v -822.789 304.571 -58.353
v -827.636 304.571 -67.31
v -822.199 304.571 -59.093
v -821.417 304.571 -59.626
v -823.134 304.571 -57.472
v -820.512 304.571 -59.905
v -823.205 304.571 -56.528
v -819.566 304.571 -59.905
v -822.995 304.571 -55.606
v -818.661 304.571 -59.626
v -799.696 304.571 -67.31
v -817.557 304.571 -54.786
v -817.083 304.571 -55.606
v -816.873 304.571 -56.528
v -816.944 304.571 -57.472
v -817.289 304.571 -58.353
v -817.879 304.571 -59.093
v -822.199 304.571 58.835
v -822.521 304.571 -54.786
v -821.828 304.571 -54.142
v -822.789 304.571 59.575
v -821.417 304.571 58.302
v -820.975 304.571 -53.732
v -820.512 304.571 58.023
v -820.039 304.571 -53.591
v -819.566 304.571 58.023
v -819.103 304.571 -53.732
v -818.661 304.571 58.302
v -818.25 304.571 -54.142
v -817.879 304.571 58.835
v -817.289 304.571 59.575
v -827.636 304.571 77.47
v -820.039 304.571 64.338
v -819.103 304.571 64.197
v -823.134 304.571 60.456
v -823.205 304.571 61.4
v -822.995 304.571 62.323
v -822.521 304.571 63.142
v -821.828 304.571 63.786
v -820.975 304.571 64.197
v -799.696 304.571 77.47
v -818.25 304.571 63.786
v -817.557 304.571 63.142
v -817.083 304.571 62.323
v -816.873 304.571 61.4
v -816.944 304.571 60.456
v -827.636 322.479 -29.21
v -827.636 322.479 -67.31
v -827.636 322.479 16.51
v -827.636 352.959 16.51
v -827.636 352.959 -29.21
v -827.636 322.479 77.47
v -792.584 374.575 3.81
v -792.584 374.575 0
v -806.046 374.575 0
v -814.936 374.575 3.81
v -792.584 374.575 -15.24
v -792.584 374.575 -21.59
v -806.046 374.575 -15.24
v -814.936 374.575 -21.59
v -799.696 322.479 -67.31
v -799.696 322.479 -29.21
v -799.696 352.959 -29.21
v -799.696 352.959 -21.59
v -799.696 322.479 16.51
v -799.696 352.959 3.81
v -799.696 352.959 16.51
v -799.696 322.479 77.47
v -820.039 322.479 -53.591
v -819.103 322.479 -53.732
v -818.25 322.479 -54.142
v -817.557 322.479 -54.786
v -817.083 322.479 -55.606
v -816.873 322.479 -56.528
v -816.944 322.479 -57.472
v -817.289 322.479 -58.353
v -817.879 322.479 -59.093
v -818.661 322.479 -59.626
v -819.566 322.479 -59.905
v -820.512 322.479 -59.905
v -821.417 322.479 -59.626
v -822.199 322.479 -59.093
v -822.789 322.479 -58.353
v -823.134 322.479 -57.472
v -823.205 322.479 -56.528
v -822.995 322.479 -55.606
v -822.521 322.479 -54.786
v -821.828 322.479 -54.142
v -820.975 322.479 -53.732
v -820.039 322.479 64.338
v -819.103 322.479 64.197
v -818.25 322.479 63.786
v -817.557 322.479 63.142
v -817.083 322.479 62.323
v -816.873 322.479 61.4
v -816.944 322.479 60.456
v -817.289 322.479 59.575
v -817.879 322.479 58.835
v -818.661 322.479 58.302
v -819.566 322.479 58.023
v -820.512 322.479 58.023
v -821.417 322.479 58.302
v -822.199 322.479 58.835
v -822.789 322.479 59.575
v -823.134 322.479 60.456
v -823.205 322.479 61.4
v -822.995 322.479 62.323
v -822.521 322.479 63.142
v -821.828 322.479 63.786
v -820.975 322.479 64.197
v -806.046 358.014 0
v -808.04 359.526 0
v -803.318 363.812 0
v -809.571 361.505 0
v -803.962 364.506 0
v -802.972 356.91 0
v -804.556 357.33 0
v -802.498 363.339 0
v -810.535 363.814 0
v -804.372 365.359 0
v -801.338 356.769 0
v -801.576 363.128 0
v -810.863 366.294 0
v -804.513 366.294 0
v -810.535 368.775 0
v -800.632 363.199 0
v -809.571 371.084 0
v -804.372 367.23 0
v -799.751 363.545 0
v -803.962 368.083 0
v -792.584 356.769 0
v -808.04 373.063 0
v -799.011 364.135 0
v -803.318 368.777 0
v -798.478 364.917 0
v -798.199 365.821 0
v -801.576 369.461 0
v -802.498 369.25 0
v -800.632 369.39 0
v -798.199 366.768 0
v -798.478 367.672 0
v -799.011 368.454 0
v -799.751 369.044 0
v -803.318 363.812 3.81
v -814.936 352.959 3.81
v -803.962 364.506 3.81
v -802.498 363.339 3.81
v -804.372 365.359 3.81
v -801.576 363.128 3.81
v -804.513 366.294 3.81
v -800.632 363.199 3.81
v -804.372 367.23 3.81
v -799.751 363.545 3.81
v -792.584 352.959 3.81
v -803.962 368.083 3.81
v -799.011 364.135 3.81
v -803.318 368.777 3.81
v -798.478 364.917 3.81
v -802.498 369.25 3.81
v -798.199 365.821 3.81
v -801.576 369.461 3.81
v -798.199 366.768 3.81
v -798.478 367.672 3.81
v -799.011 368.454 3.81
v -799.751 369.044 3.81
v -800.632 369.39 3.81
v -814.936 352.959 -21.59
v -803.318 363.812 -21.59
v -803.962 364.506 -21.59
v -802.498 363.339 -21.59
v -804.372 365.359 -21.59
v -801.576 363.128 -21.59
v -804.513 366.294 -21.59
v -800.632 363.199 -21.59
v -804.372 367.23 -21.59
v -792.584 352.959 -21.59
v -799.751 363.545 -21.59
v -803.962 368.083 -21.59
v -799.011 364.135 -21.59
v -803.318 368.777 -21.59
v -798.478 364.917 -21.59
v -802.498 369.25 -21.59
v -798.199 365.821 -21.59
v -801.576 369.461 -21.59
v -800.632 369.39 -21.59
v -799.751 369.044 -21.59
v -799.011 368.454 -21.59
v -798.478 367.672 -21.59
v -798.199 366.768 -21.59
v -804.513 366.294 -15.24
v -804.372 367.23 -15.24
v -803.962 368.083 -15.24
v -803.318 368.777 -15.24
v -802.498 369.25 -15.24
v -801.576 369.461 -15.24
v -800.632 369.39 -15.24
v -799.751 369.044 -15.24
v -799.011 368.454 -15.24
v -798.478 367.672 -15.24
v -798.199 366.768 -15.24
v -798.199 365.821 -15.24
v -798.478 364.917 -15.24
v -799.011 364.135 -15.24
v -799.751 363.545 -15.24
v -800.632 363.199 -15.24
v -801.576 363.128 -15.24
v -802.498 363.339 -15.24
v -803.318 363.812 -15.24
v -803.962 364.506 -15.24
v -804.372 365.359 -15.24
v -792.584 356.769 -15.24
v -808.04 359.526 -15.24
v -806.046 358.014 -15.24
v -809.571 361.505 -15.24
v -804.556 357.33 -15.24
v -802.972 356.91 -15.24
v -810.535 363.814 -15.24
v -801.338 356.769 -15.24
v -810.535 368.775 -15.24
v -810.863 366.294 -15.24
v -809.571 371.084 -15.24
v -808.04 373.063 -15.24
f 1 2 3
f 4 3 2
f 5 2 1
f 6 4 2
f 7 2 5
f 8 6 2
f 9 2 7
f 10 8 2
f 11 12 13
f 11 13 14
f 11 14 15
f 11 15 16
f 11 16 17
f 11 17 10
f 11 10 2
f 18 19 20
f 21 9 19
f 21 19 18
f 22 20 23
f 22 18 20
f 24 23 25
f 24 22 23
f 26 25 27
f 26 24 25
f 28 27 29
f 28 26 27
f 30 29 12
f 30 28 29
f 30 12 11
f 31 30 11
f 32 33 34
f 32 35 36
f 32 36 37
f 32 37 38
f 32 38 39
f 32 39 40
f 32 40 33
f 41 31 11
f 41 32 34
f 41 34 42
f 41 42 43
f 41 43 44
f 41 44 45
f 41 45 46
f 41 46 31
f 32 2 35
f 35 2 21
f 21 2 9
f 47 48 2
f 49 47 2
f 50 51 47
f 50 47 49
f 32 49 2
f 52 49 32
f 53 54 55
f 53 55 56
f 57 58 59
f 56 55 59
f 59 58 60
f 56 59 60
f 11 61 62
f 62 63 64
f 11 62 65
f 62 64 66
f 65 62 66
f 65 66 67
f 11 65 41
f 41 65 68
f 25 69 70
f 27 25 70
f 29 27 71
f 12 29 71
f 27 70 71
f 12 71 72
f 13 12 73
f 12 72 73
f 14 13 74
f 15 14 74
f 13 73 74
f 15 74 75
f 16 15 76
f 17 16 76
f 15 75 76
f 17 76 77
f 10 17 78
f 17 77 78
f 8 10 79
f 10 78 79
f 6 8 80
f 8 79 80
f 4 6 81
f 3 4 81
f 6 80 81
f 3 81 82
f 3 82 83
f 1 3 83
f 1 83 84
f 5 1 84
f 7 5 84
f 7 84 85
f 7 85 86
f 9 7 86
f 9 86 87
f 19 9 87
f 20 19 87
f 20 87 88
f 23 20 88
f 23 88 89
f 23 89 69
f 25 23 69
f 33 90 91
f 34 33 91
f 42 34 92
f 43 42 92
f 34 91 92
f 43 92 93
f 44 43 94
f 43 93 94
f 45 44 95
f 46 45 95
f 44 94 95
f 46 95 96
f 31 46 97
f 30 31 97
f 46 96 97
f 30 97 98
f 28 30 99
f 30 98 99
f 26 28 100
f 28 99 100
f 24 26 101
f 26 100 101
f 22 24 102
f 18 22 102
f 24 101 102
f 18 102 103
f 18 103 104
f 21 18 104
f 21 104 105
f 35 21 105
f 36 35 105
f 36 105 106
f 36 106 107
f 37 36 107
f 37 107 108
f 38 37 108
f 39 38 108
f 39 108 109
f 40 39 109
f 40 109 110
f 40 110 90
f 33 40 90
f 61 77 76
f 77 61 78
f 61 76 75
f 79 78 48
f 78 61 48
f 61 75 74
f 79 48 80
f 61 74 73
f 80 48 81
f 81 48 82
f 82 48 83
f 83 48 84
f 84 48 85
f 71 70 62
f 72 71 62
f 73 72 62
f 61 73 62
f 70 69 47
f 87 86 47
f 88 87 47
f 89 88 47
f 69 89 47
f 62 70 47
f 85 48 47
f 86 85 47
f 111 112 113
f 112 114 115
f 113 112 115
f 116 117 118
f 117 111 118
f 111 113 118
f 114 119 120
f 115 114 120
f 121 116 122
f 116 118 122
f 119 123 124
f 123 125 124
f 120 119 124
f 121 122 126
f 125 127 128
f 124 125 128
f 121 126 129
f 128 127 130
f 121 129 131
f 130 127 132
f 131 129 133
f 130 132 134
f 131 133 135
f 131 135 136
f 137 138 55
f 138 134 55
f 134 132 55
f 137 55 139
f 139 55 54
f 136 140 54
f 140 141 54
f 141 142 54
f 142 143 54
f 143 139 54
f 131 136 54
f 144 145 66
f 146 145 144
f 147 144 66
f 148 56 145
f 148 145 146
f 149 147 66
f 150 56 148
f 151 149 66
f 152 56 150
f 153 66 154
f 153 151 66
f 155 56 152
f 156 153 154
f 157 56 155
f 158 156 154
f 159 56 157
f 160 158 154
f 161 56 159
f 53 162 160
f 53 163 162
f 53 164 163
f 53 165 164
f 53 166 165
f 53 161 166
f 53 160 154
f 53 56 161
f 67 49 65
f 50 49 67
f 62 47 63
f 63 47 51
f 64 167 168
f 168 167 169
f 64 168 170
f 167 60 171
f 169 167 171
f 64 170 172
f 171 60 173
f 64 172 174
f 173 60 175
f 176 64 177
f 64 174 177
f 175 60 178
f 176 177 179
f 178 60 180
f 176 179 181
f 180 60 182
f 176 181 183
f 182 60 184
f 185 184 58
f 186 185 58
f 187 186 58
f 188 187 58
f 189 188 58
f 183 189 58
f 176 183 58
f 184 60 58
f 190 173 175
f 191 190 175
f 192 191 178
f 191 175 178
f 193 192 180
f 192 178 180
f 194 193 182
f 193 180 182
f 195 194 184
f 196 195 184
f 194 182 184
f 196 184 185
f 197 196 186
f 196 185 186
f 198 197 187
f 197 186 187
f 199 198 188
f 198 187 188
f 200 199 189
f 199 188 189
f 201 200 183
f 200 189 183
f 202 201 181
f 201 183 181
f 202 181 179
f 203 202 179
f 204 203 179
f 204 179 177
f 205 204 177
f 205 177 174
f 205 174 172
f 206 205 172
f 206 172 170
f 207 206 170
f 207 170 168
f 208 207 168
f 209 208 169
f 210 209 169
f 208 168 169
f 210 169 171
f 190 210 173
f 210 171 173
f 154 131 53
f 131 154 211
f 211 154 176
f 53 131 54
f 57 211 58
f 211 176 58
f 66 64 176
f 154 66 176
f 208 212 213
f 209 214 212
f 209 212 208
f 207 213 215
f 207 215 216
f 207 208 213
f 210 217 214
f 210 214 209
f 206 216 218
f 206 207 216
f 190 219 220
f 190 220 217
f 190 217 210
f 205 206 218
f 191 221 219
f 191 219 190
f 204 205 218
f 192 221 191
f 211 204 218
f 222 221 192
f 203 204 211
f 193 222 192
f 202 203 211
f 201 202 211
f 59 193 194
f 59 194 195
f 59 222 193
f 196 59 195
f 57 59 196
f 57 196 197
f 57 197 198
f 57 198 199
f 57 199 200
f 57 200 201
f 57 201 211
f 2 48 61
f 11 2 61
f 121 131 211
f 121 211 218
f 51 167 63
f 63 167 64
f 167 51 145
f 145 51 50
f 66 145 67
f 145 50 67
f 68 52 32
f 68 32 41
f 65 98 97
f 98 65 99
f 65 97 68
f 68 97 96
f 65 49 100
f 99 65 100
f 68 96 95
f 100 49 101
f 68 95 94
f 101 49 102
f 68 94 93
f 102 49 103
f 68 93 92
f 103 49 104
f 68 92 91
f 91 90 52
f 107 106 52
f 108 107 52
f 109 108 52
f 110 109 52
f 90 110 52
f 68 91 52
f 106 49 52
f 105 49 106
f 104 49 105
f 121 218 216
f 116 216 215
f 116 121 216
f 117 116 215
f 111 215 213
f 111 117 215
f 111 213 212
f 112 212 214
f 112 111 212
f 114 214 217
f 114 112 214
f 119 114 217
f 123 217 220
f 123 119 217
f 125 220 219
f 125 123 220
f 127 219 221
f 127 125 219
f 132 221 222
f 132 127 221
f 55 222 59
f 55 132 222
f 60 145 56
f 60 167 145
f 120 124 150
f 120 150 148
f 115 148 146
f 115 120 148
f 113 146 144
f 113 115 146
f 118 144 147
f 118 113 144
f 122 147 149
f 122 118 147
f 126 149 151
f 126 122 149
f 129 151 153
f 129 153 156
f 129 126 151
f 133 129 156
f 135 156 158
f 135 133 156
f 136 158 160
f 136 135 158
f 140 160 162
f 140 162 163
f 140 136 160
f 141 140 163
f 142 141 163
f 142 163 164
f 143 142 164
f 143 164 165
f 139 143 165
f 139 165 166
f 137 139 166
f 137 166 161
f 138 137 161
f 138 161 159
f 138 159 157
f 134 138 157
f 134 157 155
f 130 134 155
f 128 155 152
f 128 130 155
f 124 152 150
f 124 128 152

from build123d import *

# Parameters (mm, degrees)
BOSS_EXTRUDE1_DEPTH = 21.59
SKETCH2_W           = 22.352
SKETCH2_H           = 21.6154
SKETCH2_R           = 3.175
BOSS_EXTRUDE2_DEPTH = 3.81
SKETCH3_R           = 3.175
BOSS_EXTRUDE3_DEPTH = 6.35
SKETCH4_W           = 27.94
SKETCH4_H           = 144.78
BOSS_EXTRUDE4_DEPTH = 48.388036719
SKETCH5_W           = 38.1
SKETCH5_H           = 30.48
SKETCH5_W_2         = 60.96
CUT_EXTRUDE1_DEPTH  = 385.104870976
SKETCH6_R           = 3.175
CUT_EXTRUDE2_DEPTH  = 833.884500924


with BuildPart() as part:
    # Sketch1 → Boss-Extrude1 (new body)
    with BuildSketch(Plane.XY):
        with BuildLine():
            Line((-792.583825879, 352.959436719), (-792.583825879, 356.769436719))
            Line((-792.583825879, 356.769436719), (-801.338321143, 356.769436719))
            ThreePointArc((-801.338321143, 356.769436719), (-803.772947911, 357.085841957), (-806.045825879, 358.014036719))
            ThreePointArc((-806.045825879, 358.014036719), (-810.863321143, 366.294436719), (-806.045825879, 374.574836719))
            Line((-806.045825879, 374.574836719), (-814.935825879, 374.574836719))
            Line((-814.935825879, 374.574836719), (-814.935825879, 352.959436719))
            Line((-814.935825879, 352.959436719), (-792.583825879, 352.959436719))
        make_face()
    extrude(amount=-BOSS_EXTRUDE1_DEPTH)

    # Sketch2 → Boss-Extrude2 (add)
    with BuildSketch(Plane.XY):
        with Locations((-803.759825879, 363.767136719)):
            Rectangle(SKETCH2_W, SKETCH2_H)
        with Locations(Location((-801.338321143, 366.294436719, 0), (0, 0, 180))):
            Circle(SKETCH2_R, mode=Mode.SUBTRACT)
    extrude(amount=BOSS_EXTRUDE2_DEPTH)

    # Sketch3 → Boss-Extrude3 (add)
    with BuildSketch(Plane(origin=(0, 0, -21.59), x_dir=(-1, 0, 0), z_dir=(0, 0, -1))):
        with BuildLine():
            Line((792.583825879, 356.769436719), (792.583825879, 374.574836719))
            Line((792.583825879, 374.574836719), (806.045825879, 374.574836719))
            ThreePointArc((806.045825879, 374.574836719), (810.546915906, 363.859809951), (801.338321143, 356.769436719))
            Line((801.338321143, 356.769436719), (792.583825879, 356.769436719))
        make_face()
        with Locations((801.338321143, 366.294436719)):
            Circle(SKETCH3_R, mode=Mode.SUBTRACT)
    extrude(amount=-BOSS_EXTRUDE3_DEPTH)

    # Sketch4 → Boss-Extrude4 (add)
    with BuildSketch(Plane.XZ.offset(-352.959436719)):
        with Locations((-813.665825879, 5.08)):
            Rectangle(SKETCH4_W, SKETCH4_H)
    extrude(amount=BOSS_EXTRUDE4_DEPTH)

    # Sketch5 → Cut-Extrude1 (cut, through all)
    with BuildSketch(Plane.ZY.offset(827.635825879)):
        with Locations((-48.26, 337.719436719)):
            Rectangle(SKETCH5_W, SKETCH5_H)
        with Locations((46.99, 337.719436719)):
            Rectangle(SKETCH5_W_2, SKETCH5_H)
    extrude(amount=-CUT_EXTRUDE1_DEPTH, mode=Mode.SUBTRACT)

    # Sketch6 → Cut-Extrude2 (cut, through all)
    with BuildSketch(Plane(origin=(0, 322.479436719, 0), x_dir=(1, 0, 0), z_dir=(0, 1, 0))):
        with Locations(Location((-820.039, 56.765714286, 0), (0, 0, 270))):
            Circle(SKETCH6_R)
        with Locations(Location((-820.039, -61.162857143, 0), (0, 0, 270))):
            Circle(SKETCH6_R)
    extrude(amount=-CUT_EXTRUDE2_DEPTH, mode=Mode.SUBTRACT)


solid = part.part
